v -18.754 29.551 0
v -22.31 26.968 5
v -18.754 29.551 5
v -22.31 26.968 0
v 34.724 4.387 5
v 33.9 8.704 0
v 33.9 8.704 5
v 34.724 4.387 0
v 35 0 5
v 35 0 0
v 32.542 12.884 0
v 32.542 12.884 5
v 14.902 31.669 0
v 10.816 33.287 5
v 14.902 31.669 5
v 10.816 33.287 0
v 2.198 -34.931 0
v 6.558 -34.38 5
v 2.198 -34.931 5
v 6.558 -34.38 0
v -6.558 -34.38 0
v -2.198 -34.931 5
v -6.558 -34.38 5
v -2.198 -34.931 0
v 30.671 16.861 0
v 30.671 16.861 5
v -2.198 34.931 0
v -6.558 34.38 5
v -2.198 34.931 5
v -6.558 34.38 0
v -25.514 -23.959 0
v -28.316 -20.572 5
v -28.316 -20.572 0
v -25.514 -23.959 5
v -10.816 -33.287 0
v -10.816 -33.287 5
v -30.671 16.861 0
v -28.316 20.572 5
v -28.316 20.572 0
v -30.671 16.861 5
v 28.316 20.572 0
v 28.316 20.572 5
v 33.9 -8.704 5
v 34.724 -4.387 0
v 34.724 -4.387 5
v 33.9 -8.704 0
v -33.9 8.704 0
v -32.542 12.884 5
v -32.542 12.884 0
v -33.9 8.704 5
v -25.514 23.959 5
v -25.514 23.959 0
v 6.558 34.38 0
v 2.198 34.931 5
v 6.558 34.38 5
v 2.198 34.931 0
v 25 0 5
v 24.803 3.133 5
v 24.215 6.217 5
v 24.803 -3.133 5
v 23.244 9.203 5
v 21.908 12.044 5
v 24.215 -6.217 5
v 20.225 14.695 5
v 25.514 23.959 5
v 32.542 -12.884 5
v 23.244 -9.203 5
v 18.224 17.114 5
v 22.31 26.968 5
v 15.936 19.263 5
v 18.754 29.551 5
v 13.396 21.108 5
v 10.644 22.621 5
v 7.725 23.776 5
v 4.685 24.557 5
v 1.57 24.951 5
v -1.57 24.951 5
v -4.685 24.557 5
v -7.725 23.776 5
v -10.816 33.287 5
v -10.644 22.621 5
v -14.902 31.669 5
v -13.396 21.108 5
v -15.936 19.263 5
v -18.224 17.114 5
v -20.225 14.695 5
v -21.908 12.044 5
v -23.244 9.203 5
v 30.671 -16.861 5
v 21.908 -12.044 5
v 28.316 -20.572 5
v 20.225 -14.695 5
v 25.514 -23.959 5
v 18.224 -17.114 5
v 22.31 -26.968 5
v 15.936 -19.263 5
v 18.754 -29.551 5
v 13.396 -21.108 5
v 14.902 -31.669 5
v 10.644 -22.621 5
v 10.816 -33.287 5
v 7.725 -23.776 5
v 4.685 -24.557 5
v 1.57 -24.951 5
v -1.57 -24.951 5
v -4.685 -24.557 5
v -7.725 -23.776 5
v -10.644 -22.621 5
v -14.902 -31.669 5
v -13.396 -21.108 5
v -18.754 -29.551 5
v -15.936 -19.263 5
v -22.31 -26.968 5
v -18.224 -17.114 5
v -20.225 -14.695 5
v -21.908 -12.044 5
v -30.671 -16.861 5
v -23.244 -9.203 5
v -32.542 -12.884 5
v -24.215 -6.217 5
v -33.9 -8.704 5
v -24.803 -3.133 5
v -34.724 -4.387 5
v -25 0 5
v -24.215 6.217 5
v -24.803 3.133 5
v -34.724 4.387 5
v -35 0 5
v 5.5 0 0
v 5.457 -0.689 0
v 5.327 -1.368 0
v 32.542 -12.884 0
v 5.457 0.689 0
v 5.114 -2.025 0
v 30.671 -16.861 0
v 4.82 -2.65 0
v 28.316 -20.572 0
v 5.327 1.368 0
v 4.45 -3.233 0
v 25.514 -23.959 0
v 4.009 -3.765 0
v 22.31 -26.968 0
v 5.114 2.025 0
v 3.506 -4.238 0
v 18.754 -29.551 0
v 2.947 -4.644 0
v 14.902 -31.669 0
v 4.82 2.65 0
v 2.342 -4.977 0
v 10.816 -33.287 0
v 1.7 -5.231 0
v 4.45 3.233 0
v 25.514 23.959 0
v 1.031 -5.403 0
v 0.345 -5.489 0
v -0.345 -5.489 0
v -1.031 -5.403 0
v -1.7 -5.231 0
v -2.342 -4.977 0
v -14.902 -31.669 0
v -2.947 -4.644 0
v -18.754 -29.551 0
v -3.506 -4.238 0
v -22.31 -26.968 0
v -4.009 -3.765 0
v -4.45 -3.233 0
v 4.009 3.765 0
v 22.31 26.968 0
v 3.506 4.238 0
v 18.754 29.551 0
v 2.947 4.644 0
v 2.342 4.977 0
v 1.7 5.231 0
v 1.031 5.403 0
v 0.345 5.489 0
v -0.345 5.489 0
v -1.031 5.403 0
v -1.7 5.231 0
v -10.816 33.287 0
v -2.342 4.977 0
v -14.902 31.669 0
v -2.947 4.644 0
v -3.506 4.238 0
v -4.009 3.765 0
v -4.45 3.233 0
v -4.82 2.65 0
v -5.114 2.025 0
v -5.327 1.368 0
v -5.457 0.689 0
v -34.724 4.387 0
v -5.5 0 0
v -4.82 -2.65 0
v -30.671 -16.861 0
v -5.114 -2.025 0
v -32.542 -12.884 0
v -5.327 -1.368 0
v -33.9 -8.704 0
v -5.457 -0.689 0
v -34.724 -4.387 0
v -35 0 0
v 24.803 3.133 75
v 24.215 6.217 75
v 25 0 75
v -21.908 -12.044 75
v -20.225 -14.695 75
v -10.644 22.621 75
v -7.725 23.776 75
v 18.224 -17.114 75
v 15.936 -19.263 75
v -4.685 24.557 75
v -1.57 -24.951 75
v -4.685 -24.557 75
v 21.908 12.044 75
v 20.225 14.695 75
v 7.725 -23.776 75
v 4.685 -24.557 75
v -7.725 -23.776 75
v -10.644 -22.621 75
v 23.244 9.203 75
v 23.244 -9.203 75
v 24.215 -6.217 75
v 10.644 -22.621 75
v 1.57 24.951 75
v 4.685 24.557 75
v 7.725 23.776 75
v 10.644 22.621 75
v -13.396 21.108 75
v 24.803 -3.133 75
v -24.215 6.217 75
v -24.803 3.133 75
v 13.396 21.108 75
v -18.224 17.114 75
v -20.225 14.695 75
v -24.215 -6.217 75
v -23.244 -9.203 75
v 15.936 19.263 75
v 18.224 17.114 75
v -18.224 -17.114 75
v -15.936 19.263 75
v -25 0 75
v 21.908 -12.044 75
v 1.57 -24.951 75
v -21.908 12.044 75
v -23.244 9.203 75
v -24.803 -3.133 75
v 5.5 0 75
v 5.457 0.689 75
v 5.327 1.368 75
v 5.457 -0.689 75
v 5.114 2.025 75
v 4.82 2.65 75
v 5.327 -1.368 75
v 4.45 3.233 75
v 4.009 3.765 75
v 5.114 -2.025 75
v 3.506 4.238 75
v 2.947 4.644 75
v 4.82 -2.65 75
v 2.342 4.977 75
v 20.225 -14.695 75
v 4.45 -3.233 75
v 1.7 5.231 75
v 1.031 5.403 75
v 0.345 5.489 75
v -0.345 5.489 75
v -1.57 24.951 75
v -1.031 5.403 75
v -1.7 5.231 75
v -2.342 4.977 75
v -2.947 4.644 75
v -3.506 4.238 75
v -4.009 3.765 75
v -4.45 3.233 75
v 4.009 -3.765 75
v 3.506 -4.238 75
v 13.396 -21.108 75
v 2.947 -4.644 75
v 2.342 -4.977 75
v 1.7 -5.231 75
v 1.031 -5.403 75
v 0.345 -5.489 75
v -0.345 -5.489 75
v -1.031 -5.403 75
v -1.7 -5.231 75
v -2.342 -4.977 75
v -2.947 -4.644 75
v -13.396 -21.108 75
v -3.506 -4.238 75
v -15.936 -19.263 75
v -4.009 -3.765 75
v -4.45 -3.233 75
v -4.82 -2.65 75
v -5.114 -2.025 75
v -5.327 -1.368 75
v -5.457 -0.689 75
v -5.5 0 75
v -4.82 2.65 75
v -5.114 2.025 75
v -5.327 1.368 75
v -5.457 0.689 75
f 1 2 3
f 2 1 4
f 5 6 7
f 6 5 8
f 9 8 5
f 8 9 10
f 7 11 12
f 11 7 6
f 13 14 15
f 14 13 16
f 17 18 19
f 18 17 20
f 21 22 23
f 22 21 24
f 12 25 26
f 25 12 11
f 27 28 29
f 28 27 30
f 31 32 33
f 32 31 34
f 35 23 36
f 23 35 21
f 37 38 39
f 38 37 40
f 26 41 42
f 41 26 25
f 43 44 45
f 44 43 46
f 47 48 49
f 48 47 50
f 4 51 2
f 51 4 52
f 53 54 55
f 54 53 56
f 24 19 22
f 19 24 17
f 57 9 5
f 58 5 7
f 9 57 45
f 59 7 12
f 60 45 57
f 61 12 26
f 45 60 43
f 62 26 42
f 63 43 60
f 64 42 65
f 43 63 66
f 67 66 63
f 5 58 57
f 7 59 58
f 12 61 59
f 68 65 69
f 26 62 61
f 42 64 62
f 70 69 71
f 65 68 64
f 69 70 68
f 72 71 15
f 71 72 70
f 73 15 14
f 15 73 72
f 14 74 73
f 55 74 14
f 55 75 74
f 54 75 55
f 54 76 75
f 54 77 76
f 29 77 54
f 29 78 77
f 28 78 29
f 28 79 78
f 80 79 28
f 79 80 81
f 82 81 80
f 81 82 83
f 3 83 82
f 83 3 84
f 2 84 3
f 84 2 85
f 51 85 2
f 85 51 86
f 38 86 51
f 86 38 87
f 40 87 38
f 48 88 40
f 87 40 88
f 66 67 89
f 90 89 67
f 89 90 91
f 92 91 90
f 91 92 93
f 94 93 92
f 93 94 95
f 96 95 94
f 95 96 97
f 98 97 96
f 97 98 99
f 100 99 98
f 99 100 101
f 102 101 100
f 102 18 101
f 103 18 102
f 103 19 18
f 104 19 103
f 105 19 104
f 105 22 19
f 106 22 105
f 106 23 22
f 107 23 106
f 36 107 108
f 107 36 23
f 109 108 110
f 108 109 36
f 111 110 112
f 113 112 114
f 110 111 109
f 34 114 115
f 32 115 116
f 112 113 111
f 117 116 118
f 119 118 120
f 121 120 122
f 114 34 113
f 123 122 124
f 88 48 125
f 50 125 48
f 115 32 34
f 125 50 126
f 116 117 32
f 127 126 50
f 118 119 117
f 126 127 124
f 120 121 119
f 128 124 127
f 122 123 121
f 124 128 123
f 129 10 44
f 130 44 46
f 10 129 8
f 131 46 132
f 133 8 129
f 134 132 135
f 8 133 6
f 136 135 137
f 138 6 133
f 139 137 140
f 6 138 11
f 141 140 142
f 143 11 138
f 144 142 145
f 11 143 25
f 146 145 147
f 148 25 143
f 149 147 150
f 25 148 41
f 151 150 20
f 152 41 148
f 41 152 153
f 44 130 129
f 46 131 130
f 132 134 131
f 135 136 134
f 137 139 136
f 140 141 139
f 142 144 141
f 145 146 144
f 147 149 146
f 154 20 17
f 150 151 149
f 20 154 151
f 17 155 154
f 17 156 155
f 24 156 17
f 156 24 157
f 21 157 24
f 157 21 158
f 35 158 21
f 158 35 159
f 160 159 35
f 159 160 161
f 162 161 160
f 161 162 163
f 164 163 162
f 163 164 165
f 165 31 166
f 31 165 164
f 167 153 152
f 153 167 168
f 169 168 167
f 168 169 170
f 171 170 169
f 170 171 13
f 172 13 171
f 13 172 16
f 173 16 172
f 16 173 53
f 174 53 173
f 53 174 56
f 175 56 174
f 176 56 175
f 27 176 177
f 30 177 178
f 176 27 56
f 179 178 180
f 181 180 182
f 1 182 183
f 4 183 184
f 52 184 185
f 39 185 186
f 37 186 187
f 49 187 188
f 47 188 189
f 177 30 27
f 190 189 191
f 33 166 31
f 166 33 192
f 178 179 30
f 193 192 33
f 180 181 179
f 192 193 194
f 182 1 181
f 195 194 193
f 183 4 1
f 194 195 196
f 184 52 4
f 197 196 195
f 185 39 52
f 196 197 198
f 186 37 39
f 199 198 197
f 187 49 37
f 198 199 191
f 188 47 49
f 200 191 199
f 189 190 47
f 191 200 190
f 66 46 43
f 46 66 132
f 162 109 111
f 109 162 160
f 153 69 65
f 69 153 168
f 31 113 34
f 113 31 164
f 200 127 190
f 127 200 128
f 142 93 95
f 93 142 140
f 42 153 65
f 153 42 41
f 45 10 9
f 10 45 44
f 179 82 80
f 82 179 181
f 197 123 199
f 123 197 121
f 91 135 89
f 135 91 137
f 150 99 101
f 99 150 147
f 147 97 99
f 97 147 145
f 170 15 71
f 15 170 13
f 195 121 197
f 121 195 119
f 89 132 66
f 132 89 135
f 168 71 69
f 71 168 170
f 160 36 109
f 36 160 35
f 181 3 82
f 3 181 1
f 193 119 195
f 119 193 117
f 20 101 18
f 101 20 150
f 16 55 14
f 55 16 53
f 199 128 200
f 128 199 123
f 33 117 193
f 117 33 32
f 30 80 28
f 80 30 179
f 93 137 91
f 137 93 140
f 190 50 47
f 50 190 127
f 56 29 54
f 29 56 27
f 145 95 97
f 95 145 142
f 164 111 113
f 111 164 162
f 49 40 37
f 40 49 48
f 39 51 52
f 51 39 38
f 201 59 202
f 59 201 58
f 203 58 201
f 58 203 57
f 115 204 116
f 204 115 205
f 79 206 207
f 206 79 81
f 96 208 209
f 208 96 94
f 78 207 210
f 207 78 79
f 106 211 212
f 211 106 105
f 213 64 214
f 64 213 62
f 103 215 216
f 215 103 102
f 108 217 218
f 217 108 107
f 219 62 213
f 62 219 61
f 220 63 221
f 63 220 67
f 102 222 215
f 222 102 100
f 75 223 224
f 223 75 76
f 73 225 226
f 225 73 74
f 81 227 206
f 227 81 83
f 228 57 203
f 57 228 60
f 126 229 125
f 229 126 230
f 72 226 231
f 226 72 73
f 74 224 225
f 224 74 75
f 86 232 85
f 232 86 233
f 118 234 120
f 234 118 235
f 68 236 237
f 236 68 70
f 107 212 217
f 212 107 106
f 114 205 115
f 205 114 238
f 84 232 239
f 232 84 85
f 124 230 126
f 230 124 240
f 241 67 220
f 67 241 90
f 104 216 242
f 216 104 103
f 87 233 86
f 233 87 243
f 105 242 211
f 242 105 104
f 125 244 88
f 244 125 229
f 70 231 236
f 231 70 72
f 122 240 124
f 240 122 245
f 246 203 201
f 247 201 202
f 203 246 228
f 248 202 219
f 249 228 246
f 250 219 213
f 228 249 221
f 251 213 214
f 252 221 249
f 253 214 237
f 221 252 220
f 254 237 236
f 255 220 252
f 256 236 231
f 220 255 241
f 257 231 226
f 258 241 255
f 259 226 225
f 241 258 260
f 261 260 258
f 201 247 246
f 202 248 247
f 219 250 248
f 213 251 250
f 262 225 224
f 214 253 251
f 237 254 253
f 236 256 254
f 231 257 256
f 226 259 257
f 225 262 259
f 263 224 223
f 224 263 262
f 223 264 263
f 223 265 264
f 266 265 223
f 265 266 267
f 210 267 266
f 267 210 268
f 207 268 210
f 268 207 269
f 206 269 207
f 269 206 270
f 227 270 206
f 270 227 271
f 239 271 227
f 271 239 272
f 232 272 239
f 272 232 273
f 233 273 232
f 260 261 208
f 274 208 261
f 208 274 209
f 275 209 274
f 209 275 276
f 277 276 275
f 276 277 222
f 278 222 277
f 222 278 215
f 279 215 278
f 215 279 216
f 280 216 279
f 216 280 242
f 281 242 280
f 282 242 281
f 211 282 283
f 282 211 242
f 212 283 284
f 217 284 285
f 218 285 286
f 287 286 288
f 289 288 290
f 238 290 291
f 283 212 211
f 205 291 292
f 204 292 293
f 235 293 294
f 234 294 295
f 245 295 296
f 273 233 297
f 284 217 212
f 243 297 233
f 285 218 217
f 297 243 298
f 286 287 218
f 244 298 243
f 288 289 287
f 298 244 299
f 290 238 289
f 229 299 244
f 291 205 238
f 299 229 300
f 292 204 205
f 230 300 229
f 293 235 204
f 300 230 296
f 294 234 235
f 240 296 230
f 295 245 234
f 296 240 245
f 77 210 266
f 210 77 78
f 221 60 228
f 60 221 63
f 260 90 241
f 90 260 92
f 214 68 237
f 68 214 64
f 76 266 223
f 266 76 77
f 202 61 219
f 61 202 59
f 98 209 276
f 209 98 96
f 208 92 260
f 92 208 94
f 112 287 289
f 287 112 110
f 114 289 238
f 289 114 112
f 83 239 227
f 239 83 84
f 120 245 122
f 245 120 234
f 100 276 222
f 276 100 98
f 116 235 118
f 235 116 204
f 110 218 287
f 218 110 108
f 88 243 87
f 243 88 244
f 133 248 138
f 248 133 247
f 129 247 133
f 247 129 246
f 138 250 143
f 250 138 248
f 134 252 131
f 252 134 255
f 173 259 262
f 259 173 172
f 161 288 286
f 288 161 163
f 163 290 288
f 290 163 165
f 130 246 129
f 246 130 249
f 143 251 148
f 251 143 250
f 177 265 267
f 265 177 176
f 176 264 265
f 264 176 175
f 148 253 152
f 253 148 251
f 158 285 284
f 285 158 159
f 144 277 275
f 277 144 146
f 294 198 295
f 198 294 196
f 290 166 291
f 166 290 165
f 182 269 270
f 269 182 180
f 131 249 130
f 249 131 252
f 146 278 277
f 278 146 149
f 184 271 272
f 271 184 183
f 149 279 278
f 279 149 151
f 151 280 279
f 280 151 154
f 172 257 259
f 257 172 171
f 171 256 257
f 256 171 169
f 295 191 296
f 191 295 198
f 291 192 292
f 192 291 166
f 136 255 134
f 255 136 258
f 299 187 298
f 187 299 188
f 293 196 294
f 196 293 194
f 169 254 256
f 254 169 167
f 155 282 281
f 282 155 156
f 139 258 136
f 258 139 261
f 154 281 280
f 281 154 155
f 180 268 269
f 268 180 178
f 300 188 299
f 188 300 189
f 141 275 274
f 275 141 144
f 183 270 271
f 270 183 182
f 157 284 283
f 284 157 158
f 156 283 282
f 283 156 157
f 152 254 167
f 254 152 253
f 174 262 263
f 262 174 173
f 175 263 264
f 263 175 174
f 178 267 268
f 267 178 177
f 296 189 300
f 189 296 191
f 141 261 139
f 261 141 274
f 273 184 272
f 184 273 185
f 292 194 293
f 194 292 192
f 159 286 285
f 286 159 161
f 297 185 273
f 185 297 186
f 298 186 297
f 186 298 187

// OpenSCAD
// file: nuts_and_bolts.scad
// Copyright 2010 D1plo1d

// This library is dual licensed under the GPL 3.0 and the GNU Lesser General Public License as per http://creativecommons.org/licenses/LGPL/2.1/ .

//testNutsAndBolts();

module SKIPtestNutsAndBolts()
{
	$fn = 360;
	translate([0,15])nutHole(3);
	boltHole(3, length= 30);
}

MM = "mm";
INCH = "inch"; //Not yet supported

//Based on: http://www.roymech.co.uk/Useful_Tables/Screws/Hex_Screws.htm
METRIC_NUT_AC_WIDTHS =
[
	-1, //0 index is not used but reduces computation
	-1,
	-1,
	6.90,//m3
	8.10,//m4
	9.20,//m5
	11.50,//m6
	-1,
	15.50,//m8
	-1,
	19.60,//m10
	-1,
	22.10,//m12
	-1,
	-1,
	-1,
	27.70,//m16
	-1,
	-1,
	-1,
	34.60,//m20
	-1,
	-1,
	-1,
	41.60,//m24
	-1,
	-1,
	-1,
	-1,
	-1,
	53.1,//m30
	-1,
	-1,
	-1,
	-1,
	-1,
	63.5//m36
];
METRIC_NUT_THICKNESS =
[
	-1, //0 index is not used but reduces computation
	-1,
	-1,
	2.40,//m3
	3.20,//m4
	4.00,//m5
	5.00,//m6
	-1,
	6.50,//m8
	-1,
	8.00,//m10
	-1,
	10.00,//m12
	-1,
	-1,
	-1,
	13.00,//m16
	-1,
	-1,
	-1,
	16.00//m20
	-1,
	-1,
	-1,
	19.00,//m24
	-1,
	-1,
	-1,
	-1,
	-1,
	24.00,//m30
	-1,
	-1,
	-1,
	-1,
	-1,
	29.00//m36
];

COURSE_METRIC_BOLT_MAJOR_THREAD_DIAMETERS =
[//based on max values
	-1, //0 index is not used but reduces computation
	-1,
	-1,
	2.98,//m3
	3.978,//m4
	4.976,//m5
	5.974,//m6
	-1,
	7.972,//m8
	-1,
	9.968,//m10
	-1,
	11.966,//m12
	-1,
	-1,
	-1,
	15.962,//m16
	-1,
	-1,
	-1,
	19.958,//m20
	-1,
	-1,
	-1,
	23.952,//m24
	-1,
	-1,
	-1,
	-1,
	-1,
	29.947,//m30
	-1,
	-1,
	-1,
	-1,
	-1,
	35.940//m36
];

module nutHole(size, units=MM, tolerance = +0.0001, proj = -1)
{
	//takes a metric screw/nut size and looksup nut dimensions
	radius = METRIC_NUT_AC_WIDTHS[size]/2+tolerance;
	height = METRIC_NUT_THICKNESS[size]+tolerance;
	if (proj == -1)
	{
		cylinder(r= radius, h=height, $fn = 6, center=[0,0]);
	}
	if (proj == 1)
	{
		circle(r= radius, $fn = 6);
	}
	if (proj == 2)
	{
		translate([-radius/2, 0])
			square([radius*2, height]);
	}
}

module boltHole(size, units=MM, length, tolerance = +0.0001, proj = -1)
{
	radius = COURSE_METRIC_BOLT_MAJOR_THREAD_DIAMETERS[size]/2+tolerance;
//TODO: proper screw cap values
	capHeight = METRIC_NUT_THICKNESS[size]+tolerance; //METRIC_BOLT_CAP_HEIGHTS[size]+tolerance;
	capRadius = METRIC_NUT_AC_WIDTHS[size]/2+tolerance; //METRIC_BOLT_CAP_RADIUS[size]+tolerance;

	if (proj == -1)
	{
	translate([0, 0, -capHeight])
		cylinder(r= capRadius, h=capHeight, $fn=15);
	cylinder(r = radius, h = length, $fn=15);
	}
	if (proj == 1)
	{
		circle(r = radius);
	}
	if (proj == 2)
	{
		translate([-capRadius/2, -capHeight])
			square([capRadius*2, capHeight]);
		square([radius*2, length]);
	}
}

module boltHoleEx(size, units=MM, length, tolerance = +0.0001, shift_x=0, shift_y=0)
{
	radius = COURSE_METRIC_BOLT_MAJOR_THREAD_DIAMETERS[size]/2+tolerance;
//TODO: proper screw cap values
	capHeight = METRIC_NUT_THICKNESS[size]+tolerance; //METRIC_BOLT_CAP_HEIGHTS[size]+tolerance;
	capRadius = METRIC_NUT_AC_WIDTHS[size]/2+tolerance; //METRIC_BOLT_CAP_RADIUS[size]+tolerance;

	hull()
	{
		translate([0, 0, -capHeight]) cylinder(r= capRadius, h=capHeight, $fn=15);
		translate([shift_x, shift_y, -capHeight]) cylinder(r= capRadius, h=capHeight, $fn=15);
	}

	hull()
	{
		cylinder(r = radius, h = length, $fn=15);
		translate([shift_x, shift_y, 0]) cylinder(r = radius, h = length, $fn=15);
	}
}

//boltHoleEx(3, length=6);
// main file
include <nuts_and_bolts.scad>;
include <generals.scad>;

spool_hole_d = 50;
spool_hole_overhang =  20;
spool_width = 70;
spool_rod = 10;

difference()
{
    union()
    {
        cylinder(h=wall, d=spool_hole_d + spool_hole_overhang);
        cylinder(h = spool_width + wall, d= spool_hole_d);
    }
    
    translate([0,0,-1]) cylinder(h= spool_width + wall + 2, d = spool_rod+1);
}
